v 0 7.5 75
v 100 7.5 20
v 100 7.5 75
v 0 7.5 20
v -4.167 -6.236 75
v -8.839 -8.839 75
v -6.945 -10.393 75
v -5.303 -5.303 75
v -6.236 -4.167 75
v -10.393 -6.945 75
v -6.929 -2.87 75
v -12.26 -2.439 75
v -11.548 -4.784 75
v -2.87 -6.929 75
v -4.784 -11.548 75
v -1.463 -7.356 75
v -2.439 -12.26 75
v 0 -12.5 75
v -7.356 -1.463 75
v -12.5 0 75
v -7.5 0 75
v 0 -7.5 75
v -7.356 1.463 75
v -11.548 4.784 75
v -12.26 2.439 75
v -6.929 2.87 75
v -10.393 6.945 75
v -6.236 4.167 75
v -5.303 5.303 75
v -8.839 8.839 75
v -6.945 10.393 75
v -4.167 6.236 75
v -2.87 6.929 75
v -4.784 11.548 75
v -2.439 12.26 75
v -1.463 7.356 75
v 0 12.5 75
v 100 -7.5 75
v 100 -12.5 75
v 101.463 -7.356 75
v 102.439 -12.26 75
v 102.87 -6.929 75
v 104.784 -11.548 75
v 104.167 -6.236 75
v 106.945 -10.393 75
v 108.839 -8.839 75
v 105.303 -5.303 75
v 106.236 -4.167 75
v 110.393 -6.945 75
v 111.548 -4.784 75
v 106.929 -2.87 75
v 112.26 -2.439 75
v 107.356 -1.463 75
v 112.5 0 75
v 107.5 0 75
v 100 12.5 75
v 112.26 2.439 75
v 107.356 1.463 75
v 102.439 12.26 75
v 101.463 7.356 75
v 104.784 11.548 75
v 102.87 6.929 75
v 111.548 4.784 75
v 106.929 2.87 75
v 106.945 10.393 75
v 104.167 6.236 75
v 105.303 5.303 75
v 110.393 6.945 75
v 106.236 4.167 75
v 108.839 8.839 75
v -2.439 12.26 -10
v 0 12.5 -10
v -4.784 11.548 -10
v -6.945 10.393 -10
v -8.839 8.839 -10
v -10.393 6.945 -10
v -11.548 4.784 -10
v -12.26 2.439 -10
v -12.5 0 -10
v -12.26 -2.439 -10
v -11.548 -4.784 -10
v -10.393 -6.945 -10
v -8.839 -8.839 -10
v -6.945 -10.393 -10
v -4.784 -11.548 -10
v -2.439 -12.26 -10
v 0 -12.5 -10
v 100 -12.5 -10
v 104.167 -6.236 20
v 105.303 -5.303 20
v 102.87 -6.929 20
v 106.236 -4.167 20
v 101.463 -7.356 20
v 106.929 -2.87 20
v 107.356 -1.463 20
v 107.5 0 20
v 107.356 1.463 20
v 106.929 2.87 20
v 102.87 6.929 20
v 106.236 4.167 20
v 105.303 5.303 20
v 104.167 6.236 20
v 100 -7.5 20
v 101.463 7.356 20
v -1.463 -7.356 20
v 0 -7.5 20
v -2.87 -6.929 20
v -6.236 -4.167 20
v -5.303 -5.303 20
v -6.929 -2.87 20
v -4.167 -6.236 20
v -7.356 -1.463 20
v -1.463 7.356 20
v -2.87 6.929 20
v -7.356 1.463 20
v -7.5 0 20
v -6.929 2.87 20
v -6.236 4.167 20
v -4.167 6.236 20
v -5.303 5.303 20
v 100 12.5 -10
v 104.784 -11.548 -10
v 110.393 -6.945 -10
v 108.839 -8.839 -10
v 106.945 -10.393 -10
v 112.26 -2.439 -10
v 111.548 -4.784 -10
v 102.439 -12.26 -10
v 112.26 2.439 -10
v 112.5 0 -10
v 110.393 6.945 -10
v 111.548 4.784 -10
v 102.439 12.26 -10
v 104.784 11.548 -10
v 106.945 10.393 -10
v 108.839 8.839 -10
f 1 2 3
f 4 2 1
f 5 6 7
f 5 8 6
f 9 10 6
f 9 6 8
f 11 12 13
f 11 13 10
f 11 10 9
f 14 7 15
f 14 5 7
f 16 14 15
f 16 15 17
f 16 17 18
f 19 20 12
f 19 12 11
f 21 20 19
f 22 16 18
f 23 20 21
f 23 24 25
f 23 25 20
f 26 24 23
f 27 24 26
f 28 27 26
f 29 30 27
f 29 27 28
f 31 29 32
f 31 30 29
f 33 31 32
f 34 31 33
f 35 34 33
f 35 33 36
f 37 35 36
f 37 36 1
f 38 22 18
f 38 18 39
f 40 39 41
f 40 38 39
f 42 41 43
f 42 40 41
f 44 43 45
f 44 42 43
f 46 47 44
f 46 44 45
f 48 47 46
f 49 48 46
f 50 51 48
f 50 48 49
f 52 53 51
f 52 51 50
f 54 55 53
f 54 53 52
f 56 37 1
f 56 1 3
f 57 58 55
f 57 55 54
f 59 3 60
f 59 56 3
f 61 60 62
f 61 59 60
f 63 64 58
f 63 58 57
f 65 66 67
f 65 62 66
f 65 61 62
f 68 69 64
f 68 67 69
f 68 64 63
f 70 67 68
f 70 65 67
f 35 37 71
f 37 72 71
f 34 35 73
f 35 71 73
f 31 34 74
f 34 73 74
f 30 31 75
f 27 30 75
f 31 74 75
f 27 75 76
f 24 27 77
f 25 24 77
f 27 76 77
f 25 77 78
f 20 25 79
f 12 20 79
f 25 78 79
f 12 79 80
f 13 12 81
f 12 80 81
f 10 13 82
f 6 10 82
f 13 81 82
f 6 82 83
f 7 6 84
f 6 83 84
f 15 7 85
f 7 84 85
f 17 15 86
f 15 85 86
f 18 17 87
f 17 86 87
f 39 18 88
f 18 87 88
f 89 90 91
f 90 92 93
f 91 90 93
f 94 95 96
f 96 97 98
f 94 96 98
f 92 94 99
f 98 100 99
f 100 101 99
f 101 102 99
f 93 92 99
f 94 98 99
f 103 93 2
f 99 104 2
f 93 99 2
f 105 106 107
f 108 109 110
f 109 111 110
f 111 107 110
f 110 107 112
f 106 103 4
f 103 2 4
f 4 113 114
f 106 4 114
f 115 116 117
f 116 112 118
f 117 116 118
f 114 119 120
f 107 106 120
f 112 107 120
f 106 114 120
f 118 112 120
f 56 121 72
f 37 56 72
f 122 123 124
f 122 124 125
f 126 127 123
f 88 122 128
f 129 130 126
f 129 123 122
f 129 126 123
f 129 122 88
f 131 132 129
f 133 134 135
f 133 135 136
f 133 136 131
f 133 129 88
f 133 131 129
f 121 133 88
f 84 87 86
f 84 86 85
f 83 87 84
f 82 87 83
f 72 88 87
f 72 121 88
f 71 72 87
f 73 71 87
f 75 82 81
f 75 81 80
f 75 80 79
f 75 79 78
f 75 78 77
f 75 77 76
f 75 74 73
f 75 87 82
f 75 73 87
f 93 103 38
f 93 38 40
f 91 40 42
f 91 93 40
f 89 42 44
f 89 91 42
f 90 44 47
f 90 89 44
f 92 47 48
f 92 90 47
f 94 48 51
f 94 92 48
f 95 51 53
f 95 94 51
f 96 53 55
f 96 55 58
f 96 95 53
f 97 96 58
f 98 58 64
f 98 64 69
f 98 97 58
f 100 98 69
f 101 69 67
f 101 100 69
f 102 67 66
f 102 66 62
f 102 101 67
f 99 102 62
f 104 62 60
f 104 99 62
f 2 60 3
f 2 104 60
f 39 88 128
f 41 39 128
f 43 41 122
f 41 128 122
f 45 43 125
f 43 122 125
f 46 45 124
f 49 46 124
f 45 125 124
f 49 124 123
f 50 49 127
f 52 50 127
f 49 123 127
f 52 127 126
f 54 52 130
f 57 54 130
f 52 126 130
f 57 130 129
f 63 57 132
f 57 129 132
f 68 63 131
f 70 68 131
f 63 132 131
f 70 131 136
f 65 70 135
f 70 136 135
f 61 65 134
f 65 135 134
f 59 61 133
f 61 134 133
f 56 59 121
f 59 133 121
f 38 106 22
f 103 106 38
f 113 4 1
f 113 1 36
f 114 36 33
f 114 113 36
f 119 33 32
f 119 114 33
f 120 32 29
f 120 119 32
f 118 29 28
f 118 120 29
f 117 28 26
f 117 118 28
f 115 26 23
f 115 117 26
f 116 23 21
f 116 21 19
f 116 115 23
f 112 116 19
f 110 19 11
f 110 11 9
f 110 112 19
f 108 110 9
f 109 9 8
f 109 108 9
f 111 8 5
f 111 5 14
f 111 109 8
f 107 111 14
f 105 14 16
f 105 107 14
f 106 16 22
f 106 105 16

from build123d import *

# Parameters (mm, degrees)
EXTRUDE_2_DEPTH      = 20
EXTRUDE_2_DEPTH_BACK = 10
EXTRUDE_1_DEPTH      = 55


with BuildPart() as part:
    # 草图3 → 凸台-拉伸2 (new body, two sides)
    with BuildSketch(Plane.XY) as extrude_2_sk:
        with BuildLine():
            Line((0, 12.5), (100, 12.5))
            ThreePointArc((100, 12.5), (112.5, 0), (100, -12.5))
            Line((100, -12.5), (0, -12.5))
            ThreePointArc((0, -12.5), (-12.5, 0), (0, 12.5))
        make_face()
    extrude(amount=EXTRUDE_2_DEPTH)
    extrude(extrude_2_sk.sketch, amount=-EXTRUDE_2_DEPTH_BACK)

    # 草图4 → 拉伸-薄壁1 (add)
    with BuildSketch(Plane.XY.offset(20)):
        with BuildLine():
            Line((100, 12.5), (0, 12.5))
            ThreePointArc((0, 12.5), (-12.5, 0), (0, -12.5))
            Line((0, -12.5), (100, -12.5))
            ThreePointArc((100, -12.5), (112.5, 0), (100, 12.5))
        make_face()
        with BuildLine():
            Line((100, 7.5), (0, 7.5))
            ThreePointArc((0, 7.5), (-7.5, 0), (0, -7.5))
            Line((0, -7.5), (100, -7.5))
            ThreePointArc((100, -7.5), (107.5, 0), (100, 7.5))
        make_face(mode=Mode.SUBTRACT)
    extrude(amount=EXTRUDE_1_DEPTH)


solid = part.part
